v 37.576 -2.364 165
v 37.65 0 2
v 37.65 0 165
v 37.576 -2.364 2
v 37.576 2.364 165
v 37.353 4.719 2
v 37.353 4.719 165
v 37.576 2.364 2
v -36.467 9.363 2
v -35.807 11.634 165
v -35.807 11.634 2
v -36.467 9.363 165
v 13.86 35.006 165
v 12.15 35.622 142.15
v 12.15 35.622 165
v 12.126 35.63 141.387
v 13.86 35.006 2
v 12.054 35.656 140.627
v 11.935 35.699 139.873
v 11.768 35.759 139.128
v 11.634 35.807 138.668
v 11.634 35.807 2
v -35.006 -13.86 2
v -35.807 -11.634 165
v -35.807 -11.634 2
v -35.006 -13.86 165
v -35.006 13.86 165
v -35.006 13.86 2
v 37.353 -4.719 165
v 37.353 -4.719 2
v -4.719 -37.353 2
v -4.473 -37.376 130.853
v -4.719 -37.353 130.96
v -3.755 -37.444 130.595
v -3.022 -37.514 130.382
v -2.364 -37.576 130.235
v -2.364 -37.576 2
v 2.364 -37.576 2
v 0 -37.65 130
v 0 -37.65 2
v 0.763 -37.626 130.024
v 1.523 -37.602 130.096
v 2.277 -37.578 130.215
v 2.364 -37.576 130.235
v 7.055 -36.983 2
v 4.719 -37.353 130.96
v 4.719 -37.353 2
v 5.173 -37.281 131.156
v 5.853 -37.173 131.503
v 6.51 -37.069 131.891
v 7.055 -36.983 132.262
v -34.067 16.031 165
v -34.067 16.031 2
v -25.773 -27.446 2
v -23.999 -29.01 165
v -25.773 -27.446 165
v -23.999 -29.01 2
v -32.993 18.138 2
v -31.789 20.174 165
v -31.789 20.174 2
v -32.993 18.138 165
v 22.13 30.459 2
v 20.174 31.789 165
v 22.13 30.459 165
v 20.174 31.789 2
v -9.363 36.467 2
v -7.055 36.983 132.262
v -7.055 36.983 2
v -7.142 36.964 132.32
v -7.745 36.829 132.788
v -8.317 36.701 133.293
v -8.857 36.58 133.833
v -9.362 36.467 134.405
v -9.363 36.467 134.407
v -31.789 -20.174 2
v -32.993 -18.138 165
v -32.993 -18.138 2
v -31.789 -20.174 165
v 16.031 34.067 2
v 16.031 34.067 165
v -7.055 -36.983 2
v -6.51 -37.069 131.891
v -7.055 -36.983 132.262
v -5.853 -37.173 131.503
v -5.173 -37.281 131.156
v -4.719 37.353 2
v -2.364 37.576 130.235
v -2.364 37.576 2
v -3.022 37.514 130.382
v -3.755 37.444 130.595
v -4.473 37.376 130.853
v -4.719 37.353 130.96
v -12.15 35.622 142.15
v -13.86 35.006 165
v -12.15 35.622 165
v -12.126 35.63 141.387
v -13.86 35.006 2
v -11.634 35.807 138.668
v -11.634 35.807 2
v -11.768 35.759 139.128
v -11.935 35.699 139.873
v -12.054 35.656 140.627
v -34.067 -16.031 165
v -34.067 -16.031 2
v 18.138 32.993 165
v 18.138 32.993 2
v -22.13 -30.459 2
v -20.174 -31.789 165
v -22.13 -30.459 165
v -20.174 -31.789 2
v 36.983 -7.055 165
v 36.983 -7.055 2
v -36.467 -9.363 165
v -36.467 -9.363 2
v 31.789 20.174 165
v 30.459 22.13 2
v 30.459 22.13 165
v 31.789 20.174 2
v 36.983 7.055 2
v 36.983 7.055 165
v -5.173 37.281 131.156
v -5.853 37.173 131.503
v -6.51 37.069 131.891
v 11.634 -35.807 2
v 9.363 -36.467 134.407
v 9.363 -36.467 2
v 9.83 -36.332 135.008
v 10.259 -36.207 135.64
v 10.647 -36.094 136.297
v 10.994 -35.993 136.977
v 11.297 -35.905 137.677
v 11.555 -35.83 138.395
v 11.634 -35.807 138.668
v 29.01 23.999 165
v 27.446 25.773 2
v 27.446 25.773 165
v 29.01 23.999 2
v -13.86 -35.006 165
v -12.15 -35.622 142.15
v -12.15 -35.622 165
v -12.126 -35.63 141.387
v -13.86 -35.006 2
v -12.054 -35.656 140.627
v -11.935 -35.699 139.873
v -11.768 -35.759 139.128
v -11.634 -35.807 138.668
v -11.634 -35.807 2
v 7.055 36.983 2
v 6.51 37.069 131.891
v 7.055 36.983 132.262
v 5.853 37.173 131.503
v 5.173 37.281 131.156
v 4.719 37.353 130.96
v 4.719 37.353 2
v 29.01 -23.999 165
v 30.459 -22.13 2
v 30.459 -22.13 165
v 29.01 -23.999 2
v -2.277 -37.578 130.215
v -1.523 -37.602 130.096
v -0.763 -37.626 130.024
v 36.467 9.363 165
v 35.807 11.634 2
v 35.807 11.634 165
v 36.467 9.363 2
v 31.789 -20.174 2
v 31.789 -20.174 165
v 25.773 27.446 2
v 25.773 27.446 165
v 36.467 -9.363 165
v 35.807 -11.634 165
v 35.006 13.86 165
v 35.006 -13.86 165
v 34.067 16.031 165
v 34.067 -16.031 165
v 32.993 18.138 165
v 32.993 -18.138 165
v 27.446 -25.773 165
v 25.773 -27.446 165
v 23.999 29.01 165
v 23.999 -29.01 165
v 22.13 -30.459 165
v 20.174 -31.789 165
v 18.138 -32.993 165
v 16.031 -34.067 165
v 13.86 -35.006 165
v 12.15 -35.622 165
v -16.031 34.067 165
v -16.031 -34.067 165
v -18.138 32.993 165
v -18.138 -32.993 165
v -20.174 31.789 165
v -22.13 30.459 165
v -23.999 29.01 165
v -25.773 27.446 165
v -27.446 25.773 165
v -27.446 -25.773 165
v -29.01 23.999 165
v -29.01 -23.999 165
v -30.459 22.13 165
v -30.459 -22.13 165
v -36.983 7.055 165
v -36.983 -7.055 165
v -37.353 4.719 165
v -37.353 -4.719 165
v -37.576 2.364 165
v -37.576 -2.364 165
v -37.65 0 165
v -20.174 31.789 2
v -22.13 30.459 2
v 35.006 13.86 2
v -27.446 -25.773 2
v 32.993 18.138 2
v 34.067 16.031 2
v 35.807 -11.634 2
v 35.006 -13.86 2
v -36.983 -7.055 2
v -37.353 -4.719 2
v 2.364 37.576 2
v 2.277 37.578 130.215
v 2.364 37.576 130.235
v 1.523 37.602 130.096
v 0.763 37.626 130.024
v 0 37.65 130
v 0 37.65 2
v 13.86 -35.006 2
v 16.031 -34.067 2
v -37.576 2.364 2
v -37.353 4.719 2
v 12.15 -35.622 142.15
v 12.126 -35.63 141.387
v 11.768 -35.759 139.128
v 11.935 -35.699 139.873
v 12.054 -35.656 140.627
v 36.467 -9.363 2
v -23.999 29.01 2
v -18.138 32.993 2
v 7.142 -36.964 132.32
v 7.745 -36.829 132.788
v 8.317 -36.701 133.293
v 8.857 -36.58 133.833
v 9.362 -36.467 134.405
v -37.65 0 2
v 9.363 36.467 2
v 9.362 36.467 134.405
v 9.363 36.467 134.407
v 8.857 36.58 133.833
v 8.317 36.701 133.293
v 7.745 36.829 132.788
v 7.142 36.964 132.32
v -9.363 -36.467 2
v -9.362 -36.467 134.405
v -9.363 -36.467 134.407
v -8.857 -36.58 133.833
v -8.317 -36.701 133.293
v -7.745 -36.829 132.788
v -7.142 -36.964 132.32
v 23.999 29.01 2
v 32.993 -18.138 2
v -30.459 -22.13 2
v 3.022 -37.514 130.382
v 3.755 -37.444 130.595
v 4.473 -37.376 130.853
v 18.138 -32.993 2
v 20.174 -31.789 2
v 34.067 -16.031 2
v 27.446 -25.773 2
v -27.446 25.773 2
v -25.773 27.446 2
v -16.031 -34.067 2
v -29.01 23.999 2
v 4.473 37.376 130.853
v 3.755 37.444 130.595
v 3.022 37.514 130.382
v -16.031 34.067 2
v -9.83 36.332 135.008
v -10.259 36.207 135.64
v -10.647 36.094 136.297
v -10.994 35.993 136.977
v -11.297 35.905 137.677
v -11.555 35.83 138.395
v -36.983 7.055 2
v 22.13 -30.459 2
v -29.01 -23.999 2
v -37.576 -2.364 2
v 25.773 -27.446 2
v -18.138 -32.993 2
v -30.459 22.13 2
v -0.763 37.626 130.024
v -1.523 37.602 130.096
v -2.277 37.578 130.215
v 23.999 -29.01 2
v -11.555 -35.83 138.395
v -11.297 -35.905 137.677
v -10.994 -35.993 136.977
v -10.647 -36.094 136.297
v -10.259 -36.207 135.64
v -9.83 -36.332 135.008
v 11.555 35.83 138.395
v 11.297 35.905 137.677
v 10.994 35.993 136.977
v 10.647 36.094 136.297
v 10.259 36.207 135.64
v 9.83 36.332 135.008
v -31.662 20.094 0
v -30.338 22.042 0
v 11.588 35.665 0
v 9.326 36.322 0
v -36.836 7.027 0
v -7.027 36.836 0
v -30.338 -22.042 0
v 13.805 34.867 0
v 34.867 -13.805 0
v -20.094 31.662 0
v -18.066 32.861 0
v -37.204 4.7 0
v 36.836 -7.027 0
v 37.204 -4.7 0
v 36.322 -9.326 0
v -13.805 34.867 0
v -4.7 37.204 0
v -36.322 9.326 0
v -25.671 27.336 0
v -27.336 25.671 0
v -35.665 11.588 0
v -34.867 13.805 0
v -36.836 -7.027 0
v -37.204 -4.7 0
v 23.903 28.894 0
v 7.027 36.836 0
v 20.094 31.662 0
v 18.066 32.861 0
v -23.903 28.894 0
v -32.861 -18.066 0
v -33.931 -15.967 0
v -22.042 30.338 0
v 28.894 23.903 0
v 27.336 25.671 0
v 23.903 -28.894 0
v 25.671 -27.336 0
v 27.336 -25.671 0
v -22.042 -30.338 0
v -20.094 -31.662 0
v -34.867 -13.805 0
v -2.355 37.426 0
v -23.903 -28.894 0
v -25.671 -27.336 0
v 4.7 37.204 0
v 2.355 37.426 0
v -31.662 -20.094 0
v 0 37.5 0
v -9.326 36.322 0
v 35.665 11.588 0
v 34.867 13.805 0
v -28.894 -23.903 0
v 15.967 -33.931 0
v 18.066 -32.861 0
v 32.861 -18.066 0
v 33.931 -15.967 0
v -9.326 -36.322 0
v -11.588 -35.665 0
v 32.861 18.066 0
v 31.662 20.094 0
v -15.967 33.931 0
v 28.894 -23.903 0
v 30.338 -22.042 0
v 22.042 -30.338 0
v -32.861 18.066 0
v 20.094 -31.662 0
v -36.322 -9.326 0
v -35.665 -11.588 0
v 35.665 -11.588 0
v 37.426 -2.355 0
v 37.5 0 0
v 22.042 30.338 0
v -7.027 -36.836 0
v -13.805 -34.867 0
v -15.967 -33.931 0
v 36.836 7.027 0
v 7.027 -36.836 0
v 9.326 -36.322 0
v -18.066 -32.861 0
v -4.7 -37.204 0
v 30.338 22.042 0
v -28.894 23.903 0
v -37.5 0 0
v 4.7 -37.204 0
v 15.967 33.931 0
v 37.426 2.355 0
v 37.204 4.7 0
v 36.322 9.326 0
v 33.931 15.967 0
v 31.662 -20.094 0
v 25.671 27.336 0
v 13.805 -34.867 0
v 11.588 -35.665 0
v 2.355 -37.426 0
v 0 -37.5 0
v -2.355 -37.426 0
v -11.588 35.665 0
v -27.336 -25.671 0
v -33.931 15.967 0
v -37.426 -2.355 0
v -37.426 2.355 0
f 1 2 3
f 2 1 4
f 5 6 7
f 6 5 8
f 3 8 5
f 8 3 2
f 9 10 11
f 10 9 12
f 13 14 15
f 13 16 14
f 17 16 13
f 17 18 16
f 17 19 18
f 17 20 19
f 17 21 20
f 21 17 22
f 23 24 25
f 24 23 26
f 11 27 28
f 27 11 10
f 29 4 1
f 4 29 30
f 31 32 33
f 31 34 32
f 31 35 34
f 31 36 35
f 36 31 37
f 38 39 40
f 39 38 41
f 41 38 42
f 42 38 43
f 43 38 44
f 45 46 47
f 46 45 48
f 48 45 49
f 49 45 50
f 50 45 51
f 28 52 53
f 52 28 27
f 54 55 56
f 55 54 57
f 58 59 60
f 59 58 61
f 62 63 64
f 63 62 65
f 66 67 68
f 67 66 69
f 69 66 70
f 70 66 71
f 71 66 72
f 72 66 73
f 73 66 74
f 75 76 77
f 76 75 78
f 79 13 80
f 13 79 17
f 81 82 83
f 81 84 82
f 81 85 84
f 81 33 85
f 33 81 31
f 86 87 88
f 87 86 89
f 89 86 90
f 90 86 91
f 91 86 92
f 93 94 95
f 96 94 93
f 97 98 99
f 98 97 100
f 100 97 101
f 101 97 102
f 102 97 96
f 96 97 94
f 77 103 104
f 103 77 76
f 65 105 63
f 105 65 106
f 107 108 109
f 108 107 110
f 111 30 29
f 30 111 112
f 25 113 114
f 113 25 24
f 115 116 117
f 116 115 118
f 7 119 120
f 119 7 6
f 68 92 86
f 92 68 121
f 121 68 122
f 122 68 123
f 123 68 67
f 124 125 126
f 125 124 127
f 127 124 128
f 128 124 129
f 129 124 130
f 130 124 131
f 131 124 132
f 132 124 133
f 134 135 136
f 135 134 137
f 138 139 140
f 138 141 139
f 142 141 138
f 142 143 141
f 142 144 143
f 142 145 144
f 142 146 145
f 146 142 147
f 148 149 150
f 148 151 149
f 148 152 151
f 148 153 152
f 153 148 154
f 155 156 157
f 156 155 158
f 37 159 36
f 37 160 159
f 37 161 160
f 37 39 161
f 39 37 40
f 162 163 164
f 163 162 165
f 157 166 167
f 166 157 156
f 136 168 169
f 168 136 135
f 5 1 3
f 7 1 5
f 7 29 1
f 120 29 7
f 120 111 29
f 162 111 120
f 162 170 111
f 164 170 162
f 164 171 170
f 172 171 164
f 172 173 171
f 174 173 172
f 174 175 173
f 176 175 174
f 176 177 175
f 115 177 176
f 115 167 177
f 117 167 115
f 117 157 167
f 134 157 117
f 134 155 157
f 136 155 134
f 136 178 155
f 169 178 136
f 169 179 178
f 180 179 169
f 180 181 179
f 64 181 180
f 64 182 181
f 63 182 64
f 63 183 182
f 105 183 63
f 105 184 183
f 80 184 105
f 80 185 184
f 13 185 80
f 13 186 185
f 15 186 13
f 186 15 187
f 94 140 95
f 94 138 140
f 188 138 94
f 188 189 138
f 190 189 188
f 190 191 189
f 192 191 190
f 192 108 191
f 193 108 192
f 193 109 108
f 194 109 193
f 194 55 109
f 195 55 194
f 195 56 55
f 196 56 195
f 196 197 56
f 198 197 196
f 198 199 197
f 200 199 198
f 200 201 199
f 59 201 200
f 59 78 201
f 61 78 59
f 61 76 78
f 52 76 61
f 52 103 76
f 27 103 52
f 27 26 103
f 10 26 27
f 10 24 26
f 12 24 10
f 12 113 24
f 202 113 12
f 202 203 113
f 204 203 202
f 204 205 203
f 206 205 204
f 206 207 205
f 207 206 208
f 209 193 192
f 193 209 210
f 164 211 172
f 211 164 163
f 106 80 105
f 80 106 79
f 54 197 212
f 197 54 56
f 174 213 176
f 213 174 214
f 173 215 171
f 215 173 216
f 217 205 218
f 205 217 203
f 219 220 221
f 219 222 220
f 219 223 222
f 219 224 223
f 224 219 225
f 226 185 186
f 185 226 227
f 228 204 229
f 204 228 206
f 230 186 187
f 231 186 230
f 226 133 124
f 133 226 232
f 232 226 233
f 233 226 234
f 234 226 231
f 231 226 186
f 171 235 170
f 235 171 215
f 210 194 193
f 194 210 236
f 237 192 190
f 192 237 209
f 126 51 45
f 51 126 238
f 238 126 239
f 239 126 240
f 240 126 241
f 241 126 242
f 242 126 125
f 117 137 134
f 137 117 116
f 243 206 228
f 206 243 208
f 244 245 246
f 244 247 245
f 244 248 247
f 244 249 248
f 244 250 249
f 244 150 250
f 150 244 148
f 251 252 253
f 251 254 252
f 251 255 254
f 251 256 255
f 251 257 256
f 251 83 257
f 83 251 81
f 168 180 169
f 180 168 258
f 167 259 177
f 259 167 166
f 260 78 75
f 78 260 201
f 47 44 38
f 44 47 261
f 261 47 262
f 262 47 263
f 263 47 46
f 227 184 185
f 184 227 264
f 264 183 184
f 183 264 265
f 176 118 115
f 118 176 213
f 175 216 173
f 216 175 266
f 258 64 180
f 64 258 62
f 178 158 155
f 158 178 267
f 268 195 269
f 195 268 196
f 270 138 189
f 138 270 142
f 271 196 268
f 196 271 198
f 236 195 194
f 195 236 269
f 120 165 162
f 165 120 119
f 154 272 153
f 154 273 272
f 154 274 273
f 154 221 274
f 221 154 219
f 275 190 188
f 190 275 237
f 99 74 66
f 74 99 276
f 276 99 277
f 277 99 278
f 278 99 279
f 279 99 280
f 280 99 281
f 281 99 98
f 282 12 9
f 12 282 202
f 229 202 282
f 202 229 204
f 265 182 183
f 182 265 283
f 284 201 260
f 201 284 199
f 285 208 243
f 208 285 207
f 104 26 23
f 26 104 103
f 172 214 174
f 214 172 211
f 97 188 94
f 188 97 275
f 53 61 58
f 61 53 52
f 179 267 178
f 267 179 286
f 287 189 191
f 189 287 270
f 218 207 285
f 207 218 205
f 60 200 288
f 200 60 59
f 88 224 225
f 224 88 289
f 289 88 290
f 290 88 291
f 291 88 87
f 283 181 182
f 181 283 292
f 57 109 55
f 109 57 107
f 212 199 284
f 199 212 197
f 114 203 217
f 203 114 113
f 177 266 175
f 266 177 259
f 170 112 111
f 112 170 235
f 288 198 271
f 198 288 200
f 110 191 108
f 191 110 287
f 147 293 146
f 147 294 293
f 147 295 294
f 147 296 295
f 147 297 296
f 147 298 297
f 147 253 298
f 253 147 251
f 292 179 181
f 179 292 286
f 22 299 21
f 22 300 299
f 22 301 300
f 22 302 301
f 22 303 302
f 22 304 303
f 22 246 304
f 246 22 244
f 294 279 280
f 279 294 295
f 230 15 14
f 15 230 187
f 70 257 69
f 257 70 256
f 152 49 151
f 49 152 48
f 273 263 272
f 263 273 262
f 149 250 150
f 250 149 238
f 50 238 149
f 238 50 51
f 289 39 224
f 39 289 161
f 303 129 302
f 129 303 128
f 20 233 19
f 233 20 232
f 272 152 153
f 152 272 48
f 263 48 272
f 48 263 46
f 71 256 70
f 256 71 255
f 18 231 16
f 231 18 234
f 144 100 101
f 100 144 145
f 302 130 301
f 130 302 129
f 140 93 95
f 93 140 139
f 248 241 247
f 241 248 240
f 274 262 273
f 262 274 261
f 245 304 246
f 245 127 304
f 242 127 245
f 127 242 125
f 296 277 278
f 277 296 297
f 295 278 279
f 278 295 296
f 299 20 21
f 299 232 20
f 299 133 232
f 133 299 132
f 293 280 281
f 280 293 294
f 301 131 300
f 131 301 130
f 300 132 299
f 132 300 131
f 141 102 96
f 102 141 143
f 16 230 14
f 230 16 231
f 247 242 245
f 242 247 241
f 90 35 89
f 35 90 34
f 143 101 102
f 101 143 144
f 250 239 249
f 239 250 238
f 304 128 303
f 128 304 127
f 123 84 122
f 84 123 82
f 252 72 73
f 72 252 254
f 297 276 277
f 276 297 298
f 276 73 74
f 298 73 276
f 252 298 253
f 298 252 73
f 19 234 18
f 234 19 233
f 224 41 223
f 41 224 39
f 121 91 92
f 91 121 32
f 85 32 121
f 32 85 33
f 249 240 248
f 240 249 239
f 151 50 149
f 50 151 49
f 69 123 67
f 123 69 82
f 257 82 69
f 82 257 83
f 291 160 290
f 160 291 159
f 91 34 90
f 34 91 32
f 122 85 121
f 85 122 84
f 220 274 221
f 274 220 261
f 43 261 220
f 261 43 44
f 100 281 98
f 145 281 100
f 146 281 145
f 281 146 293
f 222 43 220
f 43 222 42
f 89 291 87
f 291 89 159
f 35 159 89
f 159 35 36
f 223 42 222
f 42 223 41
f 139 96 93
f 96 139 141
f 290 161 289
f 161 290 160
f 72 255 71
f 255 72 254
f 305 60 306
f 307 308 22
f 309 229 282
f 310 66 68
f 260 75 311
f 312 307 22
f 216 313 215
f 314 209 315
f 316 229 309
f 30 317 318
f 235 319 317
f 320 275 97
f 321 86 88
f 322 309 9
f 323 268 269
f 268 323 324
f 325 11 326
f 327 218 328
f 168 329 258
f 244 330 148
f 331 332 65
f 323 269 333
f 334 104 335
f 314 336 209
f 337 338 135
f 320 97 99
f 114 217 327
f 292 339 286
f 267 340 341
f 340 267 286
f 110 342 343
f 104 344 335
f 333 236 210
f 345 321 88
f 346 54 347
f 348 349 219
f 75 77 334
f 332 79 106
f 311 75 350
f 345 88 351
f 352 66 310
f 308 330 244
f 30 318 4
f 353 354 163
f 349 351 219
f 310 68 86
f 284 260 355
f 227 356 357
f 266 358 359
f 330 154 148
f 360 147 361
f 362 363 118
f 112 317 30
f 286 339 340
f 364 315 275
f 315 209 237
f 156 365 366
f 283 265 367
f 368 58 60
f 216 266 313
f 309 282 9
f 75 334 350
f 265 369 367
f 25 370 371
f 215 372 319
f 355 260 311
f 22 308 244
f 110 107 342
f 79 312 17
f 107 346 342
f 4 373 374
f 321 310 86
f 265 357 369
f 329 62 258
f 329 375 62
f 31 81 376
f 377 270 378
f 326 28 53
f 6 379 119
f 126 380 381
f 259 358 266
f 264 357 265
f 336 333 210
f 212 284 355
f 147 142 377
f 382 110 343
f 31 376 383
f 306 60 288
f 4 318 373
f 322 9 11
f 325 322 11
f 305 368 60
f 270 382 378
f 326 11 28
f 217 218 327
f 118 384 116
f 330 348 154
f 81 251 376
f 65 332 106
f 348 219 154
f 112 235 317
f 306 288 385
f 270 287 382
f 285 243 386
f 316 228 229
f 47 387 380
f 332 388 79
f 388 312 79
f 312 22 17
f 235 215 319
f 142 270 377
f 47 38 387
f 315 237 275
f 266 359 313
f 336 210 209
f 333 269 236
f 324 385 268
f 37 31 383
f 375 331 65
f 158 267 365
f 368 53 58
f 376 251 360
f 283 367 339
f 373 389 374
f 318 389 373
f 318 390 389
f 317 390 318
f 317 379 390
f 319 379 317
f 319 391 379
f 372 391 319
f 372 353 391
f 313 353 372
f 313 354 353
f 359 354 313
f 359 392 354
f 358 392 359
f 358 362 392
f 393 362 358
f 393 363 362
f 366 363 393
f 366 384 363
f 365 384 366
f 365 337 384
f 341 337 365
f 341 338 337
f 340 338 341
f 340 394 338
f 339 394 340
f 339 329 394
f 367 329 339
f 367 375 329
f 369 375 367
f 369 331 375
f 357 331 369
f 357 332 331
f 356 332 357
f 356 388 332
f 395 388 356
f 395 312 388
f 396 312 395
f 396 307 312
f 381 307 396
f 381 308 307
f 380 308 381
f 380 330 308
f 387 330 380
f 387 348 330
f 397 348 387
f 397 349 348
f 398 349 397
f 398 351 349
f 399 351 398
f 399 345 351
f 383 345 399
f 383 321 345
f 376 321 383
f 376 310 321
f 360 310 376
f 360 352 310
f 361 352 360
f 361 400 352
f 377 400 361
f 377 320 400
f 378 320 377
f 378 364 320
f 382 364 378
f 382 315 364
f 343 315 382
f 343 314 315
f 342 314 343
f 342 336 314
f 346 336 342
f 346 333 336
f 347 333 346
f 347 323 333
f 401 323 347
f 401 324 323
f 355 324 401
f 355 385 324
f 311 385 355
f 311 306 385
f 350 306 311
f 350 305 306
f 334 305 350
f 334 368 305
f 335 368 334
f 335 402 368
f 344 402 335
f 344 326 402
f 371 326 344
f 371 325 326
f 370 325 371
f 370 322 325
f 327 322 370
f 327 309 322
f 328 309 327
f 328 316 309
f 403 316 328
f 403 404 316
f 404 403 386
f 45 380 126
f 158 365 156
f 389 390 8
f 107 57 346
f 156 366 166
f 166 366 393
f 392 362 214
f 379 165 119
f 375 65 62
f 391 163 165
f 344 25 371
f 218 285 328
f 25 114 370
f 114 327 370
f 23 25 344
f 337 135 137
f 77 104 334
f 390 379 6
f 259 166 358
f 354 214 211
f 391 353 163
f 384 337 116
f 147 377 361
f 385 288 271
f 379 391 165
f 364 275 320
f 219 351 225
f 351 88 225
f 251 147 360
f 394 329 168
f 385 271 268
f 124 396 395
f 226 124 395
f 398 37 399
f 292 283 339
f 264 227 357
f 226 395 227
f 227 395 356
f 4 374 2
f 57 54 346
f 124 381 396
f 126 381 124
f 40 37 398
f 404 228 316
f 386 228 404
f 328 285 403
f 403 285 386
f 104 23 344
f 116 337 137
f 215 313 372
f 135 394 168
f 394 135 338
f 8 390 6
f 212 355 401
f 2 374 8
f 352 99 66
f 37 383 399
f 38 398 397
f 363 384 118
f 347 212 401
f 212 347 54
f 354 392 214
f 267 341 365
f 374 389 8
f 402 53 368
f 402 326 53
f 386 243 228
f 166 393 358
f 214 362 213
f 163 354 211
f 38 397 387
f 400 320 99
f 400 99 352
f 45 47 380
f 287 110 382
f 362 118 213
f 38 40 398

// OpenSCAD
$fn = 100;

base_height = 130;
raw_outer_rad = 75 / 2;
brace_height = 35;
brace_rad = 24 / 2;

material_shrinking = 0.3;
shrinking_compensation_height = 2;

rad_shrinking_adjustment = material_shrinking / 2;
outer_rad = raw_outer_rad + rad_shrinking_adjustment;

hull() {
  cylinder(r = raw_outer_rad, h = 0.1);

  translate([0, 0, shrinking_compensation_height])
    cylinder(r = outer_rad, h = 0.1);
}

translate([0, 0, shrinking_compensation_height])
  cylinder(r = outer_rad, h = base_height - shrinking_compensation_height);

translate([0, 0, base_height]) difference() {
  cylinder(r = outer_rad, h = 35);

  translate([0, outer_rad + 0.5, brace_rad + rad_shrinking_adjustment]) rotate([90, 0]) hull() {
    cylinder(r = brace_rad + rad_shrinking_adjustment, h = outer_rad * 2 + 1);
    translate([0, brace_height]) cylinder(r = brace_rad + rad_shrinking_adjustment, h = outer_rad * 2 + 1);
  }
}
